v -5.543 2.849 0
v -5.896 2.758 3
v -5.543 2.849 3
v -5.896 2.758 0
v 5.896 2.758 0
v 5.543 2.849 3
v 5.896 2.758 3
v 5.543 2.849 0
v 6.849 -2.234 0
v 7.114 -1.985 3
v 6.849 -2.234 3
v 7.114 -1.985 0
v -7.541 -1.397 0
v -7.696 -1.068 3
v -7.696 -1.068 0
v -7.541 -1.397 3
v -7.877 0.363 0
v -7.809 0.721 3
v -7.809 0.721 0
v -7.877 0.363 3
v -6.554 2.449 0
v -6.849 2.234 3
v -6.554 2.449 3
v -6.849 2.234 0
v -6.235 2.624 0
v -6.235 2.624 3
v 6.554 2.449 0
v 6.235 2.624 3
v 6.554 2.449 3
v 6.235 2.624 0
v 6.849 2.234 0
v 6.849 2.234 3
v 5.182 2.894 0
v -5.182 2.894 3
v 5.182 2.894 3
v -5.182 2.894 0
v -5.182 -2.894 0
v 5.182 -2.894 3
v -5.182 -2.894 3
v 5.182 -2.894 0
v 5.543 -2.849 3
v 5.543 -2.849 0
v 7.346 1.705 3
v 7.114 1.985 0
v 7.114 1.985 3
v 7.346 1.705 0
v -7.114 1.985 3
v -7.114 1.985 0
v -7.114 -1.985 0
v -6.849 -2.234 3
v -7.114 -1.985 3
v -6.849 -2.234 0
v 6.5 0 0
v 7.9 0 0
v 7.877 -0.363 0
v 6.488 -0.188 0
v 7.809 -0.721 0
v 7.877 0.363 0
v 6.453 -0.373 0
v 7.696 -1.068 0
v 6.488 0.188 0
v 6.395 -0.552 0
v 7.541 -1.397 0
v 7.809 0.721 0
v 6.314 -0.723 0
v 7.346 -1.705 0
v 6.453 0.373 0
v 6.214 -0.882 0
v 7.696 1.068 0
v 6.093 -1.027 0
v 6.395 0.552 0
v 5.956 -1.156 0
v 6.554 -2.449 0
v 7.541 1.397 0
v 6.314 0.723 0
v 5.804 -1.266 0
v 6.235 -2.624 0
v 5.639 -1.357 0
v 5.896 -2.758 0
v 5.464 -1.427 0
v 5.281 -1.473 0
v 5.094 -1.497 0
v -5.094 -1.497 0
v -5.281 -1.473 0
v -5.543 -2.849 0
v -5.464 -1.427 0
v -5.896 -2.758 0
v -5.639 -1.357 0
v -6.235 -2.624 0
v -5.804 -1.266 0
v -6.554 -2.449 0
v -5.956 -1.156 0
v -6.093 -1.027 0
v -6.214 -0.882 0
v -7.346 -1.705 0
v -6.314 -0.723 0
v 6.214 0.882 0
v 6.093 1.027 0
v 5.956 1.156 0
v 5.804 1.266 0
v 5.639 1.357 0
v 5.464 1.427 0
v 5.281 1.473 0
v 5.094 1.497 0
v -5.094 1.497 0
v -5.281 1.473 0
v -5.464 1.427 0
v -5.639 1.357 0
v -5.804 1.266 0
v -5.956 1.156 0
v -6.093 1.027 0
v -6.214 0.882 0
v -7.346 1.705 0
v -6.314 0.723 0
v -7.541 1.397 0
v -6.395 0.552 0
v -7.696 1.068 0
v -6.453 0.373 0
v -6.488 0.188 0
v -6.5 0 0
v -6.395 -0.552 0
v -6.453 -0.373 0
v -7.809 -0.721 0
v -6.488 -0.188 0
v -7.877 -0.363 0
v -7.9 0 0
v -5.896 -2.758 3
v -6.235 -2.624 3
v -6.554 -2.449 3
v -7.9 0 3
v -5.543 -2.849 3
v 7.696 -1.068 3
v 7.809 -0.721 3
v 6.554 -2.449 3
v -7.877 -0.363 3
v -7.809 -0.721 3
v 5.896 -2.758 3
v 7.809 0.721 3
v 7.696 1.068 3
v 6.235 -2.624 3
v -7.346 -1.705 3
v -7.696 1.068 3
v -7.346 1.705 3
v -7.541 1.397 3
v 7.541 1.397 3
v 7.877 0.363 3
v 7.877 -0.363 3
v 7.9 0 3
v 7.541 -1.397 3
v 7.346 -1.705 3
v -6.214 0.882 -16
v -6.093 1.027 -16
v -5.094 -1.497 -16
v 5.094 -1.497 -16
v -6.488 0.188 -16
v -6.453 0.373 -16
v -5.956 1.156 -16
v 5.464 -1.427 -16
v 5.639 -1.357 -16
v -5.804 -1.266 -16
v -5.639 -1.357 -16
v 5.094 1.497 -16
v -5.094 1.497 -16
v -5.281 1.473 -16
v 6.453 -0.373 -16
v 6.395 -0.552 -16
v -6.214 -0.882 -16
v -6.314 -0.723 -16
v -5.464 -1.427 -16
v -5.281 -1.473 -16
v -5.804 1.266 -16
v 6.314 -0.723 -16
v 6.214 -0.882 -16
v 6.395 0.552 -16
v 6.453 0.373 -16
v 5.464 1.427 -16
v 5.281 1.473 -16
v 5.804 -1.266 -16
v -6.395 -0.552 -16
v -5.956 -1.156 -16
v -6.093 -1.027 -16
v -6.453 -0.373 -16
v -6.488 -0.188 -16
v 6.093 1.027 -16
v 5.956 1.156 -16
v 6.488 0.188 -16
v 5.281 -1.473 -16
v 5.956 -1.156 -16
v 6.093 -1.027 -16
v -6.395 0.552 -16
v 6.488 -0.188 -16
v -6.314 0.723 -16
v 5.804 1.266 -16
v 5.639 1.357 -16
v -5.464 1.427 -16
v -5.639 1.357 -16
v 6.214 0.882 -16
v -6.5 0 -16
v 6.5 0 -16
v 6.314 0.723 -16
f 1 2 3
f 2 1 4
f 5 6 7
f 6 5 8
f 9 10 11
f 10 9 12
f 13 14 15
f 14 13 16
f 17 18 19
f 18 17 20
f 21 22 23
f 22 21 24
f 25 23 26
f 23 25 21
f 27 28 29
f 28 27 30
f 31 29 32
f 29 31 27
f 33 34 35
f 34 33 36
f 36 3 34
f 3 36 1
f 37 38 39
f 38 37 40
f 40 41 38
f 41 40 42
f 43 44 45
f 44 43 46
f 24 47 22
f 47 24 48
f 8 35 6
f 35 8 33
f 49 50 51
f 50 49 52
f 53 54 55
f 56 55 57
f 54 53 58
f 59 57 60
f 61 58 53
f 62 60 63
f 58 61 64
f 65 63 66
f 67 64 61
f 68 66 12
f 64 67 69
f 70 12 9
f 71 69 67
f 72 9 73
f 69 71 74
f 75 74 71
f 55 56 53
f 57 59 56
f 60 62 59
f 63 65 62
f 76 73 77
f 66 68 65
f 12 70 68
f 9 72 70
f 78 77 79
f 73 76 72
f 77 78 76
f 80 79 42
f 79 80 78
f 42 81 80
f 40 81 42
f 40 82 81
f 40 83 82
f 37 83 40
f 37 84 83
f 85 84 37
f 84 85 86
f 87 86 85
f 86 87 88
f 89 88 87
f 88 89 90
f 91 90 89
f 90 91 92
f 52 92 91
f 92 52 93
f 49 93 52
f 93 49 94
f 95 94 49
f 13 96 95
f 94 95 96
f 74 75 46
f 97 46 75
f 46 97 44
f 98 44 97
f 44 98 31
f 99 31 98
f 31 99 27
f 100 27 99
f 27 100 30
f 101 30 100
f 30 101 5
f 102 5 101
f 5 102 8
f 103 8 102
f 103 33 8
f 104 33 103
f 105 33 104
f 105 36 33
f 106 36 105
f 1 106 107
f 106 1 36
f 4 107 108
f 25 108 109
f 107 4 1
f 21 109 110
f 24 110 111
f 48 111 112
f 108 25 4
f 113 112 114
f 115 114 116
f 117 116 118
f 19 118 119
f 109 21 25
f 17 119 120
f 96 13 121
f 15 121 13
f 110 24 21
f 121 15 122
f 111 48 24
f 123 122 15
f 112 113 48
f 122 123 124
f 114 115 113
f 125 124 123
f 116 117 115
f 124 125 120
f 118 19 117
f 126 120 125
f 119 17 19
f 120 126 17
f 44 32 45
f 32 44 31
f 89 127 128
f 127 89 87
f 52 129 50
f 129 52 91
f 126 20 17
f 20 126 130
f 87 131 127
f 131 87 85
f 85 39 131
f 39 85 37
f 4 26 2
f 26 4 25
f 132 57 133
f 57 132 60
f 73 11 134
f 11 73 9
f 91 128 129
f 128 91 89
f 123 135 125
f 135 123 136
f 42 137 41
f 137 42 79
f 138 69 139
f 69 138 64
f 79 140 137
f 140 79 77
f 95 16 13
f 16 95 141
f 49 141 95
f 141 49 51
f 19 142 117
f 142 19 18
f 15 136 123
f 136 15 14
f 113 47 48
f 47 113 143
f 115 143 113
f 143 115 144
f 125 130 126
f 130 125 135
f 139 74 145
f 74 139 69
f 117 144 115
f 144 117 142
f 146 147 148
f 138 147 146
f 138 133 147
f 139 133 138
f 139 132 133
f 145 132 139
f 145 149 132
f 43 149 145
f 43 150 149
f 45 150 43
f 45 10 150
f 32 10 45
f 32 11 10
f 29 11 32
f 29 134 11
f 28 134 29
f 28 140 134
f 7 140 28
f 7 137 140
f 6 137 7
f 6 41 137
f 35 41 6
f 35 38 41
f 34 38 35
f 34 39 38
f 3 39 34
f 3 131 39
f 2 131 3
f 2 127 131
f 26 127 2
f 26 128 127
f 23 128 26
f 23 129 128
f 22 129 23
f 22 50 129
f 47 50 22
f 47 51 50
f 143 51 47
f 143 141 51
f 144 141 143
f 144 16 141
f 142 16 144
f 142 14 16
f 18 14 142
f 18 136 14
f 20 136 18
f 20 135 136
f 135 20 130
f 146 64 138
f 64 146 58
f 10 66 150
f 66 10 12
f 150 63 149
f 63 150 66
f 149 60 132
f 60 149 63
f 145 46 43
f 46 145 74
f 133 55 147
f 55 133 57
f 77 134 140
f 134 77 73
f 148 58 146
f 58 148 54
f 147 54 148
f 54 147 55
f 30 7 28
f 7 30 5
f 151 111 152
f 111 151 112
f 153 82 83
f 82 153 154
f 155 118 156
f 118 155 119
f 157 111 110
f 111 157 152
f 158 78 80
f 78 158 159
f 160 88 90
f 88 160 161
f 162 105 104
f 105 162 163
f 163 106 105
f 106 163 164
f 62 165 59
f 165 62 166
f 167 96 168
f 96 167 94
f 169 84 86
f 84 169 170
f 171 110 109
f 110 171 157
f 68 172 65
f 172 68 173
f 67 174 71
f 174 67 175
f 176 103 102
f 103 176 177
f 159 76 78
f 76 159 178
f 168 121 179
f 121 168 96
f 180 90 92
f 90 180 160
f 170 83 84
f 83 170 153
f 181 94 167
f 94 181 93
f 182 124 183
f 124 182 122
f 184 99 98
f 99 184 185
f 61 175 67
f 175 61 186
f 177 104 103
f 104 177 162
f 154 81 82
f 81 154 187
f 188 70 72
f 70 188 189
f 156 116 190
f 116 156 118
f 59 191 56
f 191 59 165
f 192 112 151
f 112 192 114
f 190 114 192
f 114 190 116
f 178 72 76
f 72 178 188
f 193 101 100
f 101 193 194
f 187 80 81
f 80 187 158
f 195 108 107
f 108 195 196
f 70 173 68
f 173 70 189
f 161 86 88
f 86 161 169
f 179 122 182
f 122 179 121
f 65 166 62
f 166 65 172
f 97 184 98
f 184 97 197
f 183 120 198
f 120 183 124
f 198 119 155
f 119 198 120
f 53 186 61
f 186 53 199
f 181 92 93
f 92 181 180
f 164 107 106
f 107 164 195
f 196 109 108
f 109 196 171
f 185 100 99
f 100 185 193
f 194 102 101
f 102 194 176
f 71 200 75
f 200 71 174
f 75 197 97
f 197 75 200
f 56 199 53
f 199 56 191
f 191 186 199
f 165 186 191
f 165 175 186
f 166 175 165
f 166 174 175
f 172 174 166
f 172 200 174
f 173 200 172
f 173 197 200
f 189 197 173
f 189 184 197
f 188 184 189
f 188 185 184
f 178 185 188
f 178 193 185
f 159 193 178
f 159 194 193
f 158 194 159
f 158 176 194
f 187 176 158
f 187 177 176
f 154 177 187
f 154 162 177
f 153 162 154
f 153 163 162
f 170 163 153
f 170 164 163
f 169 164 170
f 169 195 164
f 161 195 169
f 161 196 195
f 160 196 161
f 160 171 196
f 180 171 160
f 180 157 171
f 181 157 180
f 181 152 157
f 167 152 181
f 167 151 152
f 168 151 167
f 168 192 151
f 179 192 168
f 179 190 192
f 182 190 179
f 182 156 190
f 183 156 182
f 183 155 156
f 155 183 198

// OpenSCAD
$fn = 50;

difference() {
	union() {
		translate(v = [0, 0, 0]) {
			rotate(a = [0, 0, 0]) {
				difference() {
					union() {
						translate(v = [0, 0, 0]) {
							rotate(a = [0, 0, 0]) {
								hull() {
									difference() {
										union() {
											translate(v = [-5.0, 0, 0]) {
												rotate(a = [0, 0, 0]) {
													difference() {
														union() {
															cylinder(h = 3, r = 2.9);
														}
														union();
													}
												}
											}
											translate(v = [5.0, 0, 0]) {
												rotate(a = [0, 0, 0]) {
													difference() {
														union() {
															cylinder(h = 3, r = 2.9);
														}
														union();
													}
												}
											}
										}
										union();
									}
								}
							}
						}
						translate(v = [0, 0, 0]) {
							rotate(a = [0, 0, 0]) {
								hull() {
									difference() {
										union() {
											translate(v = [-5.0, 0, 0]) {
												rotate(a = [0, 0, 0]) {
													difference() {
														union() {
															translate(v = [0, 0, -16.0]) {
																cylinder(h = 16, r = 1.5);
															}
														}
														union();
													}
												}
											}
											translate(v = [5.0, 0, 0]) {
												rotate(a = [0, 0, 0]) {
													difference() {
														union() {
															translate(v = [0, 0, -16.0]) {
																cylinder(h = 16, r = 1.5);
															}
														}
														union();
													}
												}
											}
										}
										union();
									}
								}
							}
						}
					}
					union();
				}
			}
		}
	}
	union();
}
